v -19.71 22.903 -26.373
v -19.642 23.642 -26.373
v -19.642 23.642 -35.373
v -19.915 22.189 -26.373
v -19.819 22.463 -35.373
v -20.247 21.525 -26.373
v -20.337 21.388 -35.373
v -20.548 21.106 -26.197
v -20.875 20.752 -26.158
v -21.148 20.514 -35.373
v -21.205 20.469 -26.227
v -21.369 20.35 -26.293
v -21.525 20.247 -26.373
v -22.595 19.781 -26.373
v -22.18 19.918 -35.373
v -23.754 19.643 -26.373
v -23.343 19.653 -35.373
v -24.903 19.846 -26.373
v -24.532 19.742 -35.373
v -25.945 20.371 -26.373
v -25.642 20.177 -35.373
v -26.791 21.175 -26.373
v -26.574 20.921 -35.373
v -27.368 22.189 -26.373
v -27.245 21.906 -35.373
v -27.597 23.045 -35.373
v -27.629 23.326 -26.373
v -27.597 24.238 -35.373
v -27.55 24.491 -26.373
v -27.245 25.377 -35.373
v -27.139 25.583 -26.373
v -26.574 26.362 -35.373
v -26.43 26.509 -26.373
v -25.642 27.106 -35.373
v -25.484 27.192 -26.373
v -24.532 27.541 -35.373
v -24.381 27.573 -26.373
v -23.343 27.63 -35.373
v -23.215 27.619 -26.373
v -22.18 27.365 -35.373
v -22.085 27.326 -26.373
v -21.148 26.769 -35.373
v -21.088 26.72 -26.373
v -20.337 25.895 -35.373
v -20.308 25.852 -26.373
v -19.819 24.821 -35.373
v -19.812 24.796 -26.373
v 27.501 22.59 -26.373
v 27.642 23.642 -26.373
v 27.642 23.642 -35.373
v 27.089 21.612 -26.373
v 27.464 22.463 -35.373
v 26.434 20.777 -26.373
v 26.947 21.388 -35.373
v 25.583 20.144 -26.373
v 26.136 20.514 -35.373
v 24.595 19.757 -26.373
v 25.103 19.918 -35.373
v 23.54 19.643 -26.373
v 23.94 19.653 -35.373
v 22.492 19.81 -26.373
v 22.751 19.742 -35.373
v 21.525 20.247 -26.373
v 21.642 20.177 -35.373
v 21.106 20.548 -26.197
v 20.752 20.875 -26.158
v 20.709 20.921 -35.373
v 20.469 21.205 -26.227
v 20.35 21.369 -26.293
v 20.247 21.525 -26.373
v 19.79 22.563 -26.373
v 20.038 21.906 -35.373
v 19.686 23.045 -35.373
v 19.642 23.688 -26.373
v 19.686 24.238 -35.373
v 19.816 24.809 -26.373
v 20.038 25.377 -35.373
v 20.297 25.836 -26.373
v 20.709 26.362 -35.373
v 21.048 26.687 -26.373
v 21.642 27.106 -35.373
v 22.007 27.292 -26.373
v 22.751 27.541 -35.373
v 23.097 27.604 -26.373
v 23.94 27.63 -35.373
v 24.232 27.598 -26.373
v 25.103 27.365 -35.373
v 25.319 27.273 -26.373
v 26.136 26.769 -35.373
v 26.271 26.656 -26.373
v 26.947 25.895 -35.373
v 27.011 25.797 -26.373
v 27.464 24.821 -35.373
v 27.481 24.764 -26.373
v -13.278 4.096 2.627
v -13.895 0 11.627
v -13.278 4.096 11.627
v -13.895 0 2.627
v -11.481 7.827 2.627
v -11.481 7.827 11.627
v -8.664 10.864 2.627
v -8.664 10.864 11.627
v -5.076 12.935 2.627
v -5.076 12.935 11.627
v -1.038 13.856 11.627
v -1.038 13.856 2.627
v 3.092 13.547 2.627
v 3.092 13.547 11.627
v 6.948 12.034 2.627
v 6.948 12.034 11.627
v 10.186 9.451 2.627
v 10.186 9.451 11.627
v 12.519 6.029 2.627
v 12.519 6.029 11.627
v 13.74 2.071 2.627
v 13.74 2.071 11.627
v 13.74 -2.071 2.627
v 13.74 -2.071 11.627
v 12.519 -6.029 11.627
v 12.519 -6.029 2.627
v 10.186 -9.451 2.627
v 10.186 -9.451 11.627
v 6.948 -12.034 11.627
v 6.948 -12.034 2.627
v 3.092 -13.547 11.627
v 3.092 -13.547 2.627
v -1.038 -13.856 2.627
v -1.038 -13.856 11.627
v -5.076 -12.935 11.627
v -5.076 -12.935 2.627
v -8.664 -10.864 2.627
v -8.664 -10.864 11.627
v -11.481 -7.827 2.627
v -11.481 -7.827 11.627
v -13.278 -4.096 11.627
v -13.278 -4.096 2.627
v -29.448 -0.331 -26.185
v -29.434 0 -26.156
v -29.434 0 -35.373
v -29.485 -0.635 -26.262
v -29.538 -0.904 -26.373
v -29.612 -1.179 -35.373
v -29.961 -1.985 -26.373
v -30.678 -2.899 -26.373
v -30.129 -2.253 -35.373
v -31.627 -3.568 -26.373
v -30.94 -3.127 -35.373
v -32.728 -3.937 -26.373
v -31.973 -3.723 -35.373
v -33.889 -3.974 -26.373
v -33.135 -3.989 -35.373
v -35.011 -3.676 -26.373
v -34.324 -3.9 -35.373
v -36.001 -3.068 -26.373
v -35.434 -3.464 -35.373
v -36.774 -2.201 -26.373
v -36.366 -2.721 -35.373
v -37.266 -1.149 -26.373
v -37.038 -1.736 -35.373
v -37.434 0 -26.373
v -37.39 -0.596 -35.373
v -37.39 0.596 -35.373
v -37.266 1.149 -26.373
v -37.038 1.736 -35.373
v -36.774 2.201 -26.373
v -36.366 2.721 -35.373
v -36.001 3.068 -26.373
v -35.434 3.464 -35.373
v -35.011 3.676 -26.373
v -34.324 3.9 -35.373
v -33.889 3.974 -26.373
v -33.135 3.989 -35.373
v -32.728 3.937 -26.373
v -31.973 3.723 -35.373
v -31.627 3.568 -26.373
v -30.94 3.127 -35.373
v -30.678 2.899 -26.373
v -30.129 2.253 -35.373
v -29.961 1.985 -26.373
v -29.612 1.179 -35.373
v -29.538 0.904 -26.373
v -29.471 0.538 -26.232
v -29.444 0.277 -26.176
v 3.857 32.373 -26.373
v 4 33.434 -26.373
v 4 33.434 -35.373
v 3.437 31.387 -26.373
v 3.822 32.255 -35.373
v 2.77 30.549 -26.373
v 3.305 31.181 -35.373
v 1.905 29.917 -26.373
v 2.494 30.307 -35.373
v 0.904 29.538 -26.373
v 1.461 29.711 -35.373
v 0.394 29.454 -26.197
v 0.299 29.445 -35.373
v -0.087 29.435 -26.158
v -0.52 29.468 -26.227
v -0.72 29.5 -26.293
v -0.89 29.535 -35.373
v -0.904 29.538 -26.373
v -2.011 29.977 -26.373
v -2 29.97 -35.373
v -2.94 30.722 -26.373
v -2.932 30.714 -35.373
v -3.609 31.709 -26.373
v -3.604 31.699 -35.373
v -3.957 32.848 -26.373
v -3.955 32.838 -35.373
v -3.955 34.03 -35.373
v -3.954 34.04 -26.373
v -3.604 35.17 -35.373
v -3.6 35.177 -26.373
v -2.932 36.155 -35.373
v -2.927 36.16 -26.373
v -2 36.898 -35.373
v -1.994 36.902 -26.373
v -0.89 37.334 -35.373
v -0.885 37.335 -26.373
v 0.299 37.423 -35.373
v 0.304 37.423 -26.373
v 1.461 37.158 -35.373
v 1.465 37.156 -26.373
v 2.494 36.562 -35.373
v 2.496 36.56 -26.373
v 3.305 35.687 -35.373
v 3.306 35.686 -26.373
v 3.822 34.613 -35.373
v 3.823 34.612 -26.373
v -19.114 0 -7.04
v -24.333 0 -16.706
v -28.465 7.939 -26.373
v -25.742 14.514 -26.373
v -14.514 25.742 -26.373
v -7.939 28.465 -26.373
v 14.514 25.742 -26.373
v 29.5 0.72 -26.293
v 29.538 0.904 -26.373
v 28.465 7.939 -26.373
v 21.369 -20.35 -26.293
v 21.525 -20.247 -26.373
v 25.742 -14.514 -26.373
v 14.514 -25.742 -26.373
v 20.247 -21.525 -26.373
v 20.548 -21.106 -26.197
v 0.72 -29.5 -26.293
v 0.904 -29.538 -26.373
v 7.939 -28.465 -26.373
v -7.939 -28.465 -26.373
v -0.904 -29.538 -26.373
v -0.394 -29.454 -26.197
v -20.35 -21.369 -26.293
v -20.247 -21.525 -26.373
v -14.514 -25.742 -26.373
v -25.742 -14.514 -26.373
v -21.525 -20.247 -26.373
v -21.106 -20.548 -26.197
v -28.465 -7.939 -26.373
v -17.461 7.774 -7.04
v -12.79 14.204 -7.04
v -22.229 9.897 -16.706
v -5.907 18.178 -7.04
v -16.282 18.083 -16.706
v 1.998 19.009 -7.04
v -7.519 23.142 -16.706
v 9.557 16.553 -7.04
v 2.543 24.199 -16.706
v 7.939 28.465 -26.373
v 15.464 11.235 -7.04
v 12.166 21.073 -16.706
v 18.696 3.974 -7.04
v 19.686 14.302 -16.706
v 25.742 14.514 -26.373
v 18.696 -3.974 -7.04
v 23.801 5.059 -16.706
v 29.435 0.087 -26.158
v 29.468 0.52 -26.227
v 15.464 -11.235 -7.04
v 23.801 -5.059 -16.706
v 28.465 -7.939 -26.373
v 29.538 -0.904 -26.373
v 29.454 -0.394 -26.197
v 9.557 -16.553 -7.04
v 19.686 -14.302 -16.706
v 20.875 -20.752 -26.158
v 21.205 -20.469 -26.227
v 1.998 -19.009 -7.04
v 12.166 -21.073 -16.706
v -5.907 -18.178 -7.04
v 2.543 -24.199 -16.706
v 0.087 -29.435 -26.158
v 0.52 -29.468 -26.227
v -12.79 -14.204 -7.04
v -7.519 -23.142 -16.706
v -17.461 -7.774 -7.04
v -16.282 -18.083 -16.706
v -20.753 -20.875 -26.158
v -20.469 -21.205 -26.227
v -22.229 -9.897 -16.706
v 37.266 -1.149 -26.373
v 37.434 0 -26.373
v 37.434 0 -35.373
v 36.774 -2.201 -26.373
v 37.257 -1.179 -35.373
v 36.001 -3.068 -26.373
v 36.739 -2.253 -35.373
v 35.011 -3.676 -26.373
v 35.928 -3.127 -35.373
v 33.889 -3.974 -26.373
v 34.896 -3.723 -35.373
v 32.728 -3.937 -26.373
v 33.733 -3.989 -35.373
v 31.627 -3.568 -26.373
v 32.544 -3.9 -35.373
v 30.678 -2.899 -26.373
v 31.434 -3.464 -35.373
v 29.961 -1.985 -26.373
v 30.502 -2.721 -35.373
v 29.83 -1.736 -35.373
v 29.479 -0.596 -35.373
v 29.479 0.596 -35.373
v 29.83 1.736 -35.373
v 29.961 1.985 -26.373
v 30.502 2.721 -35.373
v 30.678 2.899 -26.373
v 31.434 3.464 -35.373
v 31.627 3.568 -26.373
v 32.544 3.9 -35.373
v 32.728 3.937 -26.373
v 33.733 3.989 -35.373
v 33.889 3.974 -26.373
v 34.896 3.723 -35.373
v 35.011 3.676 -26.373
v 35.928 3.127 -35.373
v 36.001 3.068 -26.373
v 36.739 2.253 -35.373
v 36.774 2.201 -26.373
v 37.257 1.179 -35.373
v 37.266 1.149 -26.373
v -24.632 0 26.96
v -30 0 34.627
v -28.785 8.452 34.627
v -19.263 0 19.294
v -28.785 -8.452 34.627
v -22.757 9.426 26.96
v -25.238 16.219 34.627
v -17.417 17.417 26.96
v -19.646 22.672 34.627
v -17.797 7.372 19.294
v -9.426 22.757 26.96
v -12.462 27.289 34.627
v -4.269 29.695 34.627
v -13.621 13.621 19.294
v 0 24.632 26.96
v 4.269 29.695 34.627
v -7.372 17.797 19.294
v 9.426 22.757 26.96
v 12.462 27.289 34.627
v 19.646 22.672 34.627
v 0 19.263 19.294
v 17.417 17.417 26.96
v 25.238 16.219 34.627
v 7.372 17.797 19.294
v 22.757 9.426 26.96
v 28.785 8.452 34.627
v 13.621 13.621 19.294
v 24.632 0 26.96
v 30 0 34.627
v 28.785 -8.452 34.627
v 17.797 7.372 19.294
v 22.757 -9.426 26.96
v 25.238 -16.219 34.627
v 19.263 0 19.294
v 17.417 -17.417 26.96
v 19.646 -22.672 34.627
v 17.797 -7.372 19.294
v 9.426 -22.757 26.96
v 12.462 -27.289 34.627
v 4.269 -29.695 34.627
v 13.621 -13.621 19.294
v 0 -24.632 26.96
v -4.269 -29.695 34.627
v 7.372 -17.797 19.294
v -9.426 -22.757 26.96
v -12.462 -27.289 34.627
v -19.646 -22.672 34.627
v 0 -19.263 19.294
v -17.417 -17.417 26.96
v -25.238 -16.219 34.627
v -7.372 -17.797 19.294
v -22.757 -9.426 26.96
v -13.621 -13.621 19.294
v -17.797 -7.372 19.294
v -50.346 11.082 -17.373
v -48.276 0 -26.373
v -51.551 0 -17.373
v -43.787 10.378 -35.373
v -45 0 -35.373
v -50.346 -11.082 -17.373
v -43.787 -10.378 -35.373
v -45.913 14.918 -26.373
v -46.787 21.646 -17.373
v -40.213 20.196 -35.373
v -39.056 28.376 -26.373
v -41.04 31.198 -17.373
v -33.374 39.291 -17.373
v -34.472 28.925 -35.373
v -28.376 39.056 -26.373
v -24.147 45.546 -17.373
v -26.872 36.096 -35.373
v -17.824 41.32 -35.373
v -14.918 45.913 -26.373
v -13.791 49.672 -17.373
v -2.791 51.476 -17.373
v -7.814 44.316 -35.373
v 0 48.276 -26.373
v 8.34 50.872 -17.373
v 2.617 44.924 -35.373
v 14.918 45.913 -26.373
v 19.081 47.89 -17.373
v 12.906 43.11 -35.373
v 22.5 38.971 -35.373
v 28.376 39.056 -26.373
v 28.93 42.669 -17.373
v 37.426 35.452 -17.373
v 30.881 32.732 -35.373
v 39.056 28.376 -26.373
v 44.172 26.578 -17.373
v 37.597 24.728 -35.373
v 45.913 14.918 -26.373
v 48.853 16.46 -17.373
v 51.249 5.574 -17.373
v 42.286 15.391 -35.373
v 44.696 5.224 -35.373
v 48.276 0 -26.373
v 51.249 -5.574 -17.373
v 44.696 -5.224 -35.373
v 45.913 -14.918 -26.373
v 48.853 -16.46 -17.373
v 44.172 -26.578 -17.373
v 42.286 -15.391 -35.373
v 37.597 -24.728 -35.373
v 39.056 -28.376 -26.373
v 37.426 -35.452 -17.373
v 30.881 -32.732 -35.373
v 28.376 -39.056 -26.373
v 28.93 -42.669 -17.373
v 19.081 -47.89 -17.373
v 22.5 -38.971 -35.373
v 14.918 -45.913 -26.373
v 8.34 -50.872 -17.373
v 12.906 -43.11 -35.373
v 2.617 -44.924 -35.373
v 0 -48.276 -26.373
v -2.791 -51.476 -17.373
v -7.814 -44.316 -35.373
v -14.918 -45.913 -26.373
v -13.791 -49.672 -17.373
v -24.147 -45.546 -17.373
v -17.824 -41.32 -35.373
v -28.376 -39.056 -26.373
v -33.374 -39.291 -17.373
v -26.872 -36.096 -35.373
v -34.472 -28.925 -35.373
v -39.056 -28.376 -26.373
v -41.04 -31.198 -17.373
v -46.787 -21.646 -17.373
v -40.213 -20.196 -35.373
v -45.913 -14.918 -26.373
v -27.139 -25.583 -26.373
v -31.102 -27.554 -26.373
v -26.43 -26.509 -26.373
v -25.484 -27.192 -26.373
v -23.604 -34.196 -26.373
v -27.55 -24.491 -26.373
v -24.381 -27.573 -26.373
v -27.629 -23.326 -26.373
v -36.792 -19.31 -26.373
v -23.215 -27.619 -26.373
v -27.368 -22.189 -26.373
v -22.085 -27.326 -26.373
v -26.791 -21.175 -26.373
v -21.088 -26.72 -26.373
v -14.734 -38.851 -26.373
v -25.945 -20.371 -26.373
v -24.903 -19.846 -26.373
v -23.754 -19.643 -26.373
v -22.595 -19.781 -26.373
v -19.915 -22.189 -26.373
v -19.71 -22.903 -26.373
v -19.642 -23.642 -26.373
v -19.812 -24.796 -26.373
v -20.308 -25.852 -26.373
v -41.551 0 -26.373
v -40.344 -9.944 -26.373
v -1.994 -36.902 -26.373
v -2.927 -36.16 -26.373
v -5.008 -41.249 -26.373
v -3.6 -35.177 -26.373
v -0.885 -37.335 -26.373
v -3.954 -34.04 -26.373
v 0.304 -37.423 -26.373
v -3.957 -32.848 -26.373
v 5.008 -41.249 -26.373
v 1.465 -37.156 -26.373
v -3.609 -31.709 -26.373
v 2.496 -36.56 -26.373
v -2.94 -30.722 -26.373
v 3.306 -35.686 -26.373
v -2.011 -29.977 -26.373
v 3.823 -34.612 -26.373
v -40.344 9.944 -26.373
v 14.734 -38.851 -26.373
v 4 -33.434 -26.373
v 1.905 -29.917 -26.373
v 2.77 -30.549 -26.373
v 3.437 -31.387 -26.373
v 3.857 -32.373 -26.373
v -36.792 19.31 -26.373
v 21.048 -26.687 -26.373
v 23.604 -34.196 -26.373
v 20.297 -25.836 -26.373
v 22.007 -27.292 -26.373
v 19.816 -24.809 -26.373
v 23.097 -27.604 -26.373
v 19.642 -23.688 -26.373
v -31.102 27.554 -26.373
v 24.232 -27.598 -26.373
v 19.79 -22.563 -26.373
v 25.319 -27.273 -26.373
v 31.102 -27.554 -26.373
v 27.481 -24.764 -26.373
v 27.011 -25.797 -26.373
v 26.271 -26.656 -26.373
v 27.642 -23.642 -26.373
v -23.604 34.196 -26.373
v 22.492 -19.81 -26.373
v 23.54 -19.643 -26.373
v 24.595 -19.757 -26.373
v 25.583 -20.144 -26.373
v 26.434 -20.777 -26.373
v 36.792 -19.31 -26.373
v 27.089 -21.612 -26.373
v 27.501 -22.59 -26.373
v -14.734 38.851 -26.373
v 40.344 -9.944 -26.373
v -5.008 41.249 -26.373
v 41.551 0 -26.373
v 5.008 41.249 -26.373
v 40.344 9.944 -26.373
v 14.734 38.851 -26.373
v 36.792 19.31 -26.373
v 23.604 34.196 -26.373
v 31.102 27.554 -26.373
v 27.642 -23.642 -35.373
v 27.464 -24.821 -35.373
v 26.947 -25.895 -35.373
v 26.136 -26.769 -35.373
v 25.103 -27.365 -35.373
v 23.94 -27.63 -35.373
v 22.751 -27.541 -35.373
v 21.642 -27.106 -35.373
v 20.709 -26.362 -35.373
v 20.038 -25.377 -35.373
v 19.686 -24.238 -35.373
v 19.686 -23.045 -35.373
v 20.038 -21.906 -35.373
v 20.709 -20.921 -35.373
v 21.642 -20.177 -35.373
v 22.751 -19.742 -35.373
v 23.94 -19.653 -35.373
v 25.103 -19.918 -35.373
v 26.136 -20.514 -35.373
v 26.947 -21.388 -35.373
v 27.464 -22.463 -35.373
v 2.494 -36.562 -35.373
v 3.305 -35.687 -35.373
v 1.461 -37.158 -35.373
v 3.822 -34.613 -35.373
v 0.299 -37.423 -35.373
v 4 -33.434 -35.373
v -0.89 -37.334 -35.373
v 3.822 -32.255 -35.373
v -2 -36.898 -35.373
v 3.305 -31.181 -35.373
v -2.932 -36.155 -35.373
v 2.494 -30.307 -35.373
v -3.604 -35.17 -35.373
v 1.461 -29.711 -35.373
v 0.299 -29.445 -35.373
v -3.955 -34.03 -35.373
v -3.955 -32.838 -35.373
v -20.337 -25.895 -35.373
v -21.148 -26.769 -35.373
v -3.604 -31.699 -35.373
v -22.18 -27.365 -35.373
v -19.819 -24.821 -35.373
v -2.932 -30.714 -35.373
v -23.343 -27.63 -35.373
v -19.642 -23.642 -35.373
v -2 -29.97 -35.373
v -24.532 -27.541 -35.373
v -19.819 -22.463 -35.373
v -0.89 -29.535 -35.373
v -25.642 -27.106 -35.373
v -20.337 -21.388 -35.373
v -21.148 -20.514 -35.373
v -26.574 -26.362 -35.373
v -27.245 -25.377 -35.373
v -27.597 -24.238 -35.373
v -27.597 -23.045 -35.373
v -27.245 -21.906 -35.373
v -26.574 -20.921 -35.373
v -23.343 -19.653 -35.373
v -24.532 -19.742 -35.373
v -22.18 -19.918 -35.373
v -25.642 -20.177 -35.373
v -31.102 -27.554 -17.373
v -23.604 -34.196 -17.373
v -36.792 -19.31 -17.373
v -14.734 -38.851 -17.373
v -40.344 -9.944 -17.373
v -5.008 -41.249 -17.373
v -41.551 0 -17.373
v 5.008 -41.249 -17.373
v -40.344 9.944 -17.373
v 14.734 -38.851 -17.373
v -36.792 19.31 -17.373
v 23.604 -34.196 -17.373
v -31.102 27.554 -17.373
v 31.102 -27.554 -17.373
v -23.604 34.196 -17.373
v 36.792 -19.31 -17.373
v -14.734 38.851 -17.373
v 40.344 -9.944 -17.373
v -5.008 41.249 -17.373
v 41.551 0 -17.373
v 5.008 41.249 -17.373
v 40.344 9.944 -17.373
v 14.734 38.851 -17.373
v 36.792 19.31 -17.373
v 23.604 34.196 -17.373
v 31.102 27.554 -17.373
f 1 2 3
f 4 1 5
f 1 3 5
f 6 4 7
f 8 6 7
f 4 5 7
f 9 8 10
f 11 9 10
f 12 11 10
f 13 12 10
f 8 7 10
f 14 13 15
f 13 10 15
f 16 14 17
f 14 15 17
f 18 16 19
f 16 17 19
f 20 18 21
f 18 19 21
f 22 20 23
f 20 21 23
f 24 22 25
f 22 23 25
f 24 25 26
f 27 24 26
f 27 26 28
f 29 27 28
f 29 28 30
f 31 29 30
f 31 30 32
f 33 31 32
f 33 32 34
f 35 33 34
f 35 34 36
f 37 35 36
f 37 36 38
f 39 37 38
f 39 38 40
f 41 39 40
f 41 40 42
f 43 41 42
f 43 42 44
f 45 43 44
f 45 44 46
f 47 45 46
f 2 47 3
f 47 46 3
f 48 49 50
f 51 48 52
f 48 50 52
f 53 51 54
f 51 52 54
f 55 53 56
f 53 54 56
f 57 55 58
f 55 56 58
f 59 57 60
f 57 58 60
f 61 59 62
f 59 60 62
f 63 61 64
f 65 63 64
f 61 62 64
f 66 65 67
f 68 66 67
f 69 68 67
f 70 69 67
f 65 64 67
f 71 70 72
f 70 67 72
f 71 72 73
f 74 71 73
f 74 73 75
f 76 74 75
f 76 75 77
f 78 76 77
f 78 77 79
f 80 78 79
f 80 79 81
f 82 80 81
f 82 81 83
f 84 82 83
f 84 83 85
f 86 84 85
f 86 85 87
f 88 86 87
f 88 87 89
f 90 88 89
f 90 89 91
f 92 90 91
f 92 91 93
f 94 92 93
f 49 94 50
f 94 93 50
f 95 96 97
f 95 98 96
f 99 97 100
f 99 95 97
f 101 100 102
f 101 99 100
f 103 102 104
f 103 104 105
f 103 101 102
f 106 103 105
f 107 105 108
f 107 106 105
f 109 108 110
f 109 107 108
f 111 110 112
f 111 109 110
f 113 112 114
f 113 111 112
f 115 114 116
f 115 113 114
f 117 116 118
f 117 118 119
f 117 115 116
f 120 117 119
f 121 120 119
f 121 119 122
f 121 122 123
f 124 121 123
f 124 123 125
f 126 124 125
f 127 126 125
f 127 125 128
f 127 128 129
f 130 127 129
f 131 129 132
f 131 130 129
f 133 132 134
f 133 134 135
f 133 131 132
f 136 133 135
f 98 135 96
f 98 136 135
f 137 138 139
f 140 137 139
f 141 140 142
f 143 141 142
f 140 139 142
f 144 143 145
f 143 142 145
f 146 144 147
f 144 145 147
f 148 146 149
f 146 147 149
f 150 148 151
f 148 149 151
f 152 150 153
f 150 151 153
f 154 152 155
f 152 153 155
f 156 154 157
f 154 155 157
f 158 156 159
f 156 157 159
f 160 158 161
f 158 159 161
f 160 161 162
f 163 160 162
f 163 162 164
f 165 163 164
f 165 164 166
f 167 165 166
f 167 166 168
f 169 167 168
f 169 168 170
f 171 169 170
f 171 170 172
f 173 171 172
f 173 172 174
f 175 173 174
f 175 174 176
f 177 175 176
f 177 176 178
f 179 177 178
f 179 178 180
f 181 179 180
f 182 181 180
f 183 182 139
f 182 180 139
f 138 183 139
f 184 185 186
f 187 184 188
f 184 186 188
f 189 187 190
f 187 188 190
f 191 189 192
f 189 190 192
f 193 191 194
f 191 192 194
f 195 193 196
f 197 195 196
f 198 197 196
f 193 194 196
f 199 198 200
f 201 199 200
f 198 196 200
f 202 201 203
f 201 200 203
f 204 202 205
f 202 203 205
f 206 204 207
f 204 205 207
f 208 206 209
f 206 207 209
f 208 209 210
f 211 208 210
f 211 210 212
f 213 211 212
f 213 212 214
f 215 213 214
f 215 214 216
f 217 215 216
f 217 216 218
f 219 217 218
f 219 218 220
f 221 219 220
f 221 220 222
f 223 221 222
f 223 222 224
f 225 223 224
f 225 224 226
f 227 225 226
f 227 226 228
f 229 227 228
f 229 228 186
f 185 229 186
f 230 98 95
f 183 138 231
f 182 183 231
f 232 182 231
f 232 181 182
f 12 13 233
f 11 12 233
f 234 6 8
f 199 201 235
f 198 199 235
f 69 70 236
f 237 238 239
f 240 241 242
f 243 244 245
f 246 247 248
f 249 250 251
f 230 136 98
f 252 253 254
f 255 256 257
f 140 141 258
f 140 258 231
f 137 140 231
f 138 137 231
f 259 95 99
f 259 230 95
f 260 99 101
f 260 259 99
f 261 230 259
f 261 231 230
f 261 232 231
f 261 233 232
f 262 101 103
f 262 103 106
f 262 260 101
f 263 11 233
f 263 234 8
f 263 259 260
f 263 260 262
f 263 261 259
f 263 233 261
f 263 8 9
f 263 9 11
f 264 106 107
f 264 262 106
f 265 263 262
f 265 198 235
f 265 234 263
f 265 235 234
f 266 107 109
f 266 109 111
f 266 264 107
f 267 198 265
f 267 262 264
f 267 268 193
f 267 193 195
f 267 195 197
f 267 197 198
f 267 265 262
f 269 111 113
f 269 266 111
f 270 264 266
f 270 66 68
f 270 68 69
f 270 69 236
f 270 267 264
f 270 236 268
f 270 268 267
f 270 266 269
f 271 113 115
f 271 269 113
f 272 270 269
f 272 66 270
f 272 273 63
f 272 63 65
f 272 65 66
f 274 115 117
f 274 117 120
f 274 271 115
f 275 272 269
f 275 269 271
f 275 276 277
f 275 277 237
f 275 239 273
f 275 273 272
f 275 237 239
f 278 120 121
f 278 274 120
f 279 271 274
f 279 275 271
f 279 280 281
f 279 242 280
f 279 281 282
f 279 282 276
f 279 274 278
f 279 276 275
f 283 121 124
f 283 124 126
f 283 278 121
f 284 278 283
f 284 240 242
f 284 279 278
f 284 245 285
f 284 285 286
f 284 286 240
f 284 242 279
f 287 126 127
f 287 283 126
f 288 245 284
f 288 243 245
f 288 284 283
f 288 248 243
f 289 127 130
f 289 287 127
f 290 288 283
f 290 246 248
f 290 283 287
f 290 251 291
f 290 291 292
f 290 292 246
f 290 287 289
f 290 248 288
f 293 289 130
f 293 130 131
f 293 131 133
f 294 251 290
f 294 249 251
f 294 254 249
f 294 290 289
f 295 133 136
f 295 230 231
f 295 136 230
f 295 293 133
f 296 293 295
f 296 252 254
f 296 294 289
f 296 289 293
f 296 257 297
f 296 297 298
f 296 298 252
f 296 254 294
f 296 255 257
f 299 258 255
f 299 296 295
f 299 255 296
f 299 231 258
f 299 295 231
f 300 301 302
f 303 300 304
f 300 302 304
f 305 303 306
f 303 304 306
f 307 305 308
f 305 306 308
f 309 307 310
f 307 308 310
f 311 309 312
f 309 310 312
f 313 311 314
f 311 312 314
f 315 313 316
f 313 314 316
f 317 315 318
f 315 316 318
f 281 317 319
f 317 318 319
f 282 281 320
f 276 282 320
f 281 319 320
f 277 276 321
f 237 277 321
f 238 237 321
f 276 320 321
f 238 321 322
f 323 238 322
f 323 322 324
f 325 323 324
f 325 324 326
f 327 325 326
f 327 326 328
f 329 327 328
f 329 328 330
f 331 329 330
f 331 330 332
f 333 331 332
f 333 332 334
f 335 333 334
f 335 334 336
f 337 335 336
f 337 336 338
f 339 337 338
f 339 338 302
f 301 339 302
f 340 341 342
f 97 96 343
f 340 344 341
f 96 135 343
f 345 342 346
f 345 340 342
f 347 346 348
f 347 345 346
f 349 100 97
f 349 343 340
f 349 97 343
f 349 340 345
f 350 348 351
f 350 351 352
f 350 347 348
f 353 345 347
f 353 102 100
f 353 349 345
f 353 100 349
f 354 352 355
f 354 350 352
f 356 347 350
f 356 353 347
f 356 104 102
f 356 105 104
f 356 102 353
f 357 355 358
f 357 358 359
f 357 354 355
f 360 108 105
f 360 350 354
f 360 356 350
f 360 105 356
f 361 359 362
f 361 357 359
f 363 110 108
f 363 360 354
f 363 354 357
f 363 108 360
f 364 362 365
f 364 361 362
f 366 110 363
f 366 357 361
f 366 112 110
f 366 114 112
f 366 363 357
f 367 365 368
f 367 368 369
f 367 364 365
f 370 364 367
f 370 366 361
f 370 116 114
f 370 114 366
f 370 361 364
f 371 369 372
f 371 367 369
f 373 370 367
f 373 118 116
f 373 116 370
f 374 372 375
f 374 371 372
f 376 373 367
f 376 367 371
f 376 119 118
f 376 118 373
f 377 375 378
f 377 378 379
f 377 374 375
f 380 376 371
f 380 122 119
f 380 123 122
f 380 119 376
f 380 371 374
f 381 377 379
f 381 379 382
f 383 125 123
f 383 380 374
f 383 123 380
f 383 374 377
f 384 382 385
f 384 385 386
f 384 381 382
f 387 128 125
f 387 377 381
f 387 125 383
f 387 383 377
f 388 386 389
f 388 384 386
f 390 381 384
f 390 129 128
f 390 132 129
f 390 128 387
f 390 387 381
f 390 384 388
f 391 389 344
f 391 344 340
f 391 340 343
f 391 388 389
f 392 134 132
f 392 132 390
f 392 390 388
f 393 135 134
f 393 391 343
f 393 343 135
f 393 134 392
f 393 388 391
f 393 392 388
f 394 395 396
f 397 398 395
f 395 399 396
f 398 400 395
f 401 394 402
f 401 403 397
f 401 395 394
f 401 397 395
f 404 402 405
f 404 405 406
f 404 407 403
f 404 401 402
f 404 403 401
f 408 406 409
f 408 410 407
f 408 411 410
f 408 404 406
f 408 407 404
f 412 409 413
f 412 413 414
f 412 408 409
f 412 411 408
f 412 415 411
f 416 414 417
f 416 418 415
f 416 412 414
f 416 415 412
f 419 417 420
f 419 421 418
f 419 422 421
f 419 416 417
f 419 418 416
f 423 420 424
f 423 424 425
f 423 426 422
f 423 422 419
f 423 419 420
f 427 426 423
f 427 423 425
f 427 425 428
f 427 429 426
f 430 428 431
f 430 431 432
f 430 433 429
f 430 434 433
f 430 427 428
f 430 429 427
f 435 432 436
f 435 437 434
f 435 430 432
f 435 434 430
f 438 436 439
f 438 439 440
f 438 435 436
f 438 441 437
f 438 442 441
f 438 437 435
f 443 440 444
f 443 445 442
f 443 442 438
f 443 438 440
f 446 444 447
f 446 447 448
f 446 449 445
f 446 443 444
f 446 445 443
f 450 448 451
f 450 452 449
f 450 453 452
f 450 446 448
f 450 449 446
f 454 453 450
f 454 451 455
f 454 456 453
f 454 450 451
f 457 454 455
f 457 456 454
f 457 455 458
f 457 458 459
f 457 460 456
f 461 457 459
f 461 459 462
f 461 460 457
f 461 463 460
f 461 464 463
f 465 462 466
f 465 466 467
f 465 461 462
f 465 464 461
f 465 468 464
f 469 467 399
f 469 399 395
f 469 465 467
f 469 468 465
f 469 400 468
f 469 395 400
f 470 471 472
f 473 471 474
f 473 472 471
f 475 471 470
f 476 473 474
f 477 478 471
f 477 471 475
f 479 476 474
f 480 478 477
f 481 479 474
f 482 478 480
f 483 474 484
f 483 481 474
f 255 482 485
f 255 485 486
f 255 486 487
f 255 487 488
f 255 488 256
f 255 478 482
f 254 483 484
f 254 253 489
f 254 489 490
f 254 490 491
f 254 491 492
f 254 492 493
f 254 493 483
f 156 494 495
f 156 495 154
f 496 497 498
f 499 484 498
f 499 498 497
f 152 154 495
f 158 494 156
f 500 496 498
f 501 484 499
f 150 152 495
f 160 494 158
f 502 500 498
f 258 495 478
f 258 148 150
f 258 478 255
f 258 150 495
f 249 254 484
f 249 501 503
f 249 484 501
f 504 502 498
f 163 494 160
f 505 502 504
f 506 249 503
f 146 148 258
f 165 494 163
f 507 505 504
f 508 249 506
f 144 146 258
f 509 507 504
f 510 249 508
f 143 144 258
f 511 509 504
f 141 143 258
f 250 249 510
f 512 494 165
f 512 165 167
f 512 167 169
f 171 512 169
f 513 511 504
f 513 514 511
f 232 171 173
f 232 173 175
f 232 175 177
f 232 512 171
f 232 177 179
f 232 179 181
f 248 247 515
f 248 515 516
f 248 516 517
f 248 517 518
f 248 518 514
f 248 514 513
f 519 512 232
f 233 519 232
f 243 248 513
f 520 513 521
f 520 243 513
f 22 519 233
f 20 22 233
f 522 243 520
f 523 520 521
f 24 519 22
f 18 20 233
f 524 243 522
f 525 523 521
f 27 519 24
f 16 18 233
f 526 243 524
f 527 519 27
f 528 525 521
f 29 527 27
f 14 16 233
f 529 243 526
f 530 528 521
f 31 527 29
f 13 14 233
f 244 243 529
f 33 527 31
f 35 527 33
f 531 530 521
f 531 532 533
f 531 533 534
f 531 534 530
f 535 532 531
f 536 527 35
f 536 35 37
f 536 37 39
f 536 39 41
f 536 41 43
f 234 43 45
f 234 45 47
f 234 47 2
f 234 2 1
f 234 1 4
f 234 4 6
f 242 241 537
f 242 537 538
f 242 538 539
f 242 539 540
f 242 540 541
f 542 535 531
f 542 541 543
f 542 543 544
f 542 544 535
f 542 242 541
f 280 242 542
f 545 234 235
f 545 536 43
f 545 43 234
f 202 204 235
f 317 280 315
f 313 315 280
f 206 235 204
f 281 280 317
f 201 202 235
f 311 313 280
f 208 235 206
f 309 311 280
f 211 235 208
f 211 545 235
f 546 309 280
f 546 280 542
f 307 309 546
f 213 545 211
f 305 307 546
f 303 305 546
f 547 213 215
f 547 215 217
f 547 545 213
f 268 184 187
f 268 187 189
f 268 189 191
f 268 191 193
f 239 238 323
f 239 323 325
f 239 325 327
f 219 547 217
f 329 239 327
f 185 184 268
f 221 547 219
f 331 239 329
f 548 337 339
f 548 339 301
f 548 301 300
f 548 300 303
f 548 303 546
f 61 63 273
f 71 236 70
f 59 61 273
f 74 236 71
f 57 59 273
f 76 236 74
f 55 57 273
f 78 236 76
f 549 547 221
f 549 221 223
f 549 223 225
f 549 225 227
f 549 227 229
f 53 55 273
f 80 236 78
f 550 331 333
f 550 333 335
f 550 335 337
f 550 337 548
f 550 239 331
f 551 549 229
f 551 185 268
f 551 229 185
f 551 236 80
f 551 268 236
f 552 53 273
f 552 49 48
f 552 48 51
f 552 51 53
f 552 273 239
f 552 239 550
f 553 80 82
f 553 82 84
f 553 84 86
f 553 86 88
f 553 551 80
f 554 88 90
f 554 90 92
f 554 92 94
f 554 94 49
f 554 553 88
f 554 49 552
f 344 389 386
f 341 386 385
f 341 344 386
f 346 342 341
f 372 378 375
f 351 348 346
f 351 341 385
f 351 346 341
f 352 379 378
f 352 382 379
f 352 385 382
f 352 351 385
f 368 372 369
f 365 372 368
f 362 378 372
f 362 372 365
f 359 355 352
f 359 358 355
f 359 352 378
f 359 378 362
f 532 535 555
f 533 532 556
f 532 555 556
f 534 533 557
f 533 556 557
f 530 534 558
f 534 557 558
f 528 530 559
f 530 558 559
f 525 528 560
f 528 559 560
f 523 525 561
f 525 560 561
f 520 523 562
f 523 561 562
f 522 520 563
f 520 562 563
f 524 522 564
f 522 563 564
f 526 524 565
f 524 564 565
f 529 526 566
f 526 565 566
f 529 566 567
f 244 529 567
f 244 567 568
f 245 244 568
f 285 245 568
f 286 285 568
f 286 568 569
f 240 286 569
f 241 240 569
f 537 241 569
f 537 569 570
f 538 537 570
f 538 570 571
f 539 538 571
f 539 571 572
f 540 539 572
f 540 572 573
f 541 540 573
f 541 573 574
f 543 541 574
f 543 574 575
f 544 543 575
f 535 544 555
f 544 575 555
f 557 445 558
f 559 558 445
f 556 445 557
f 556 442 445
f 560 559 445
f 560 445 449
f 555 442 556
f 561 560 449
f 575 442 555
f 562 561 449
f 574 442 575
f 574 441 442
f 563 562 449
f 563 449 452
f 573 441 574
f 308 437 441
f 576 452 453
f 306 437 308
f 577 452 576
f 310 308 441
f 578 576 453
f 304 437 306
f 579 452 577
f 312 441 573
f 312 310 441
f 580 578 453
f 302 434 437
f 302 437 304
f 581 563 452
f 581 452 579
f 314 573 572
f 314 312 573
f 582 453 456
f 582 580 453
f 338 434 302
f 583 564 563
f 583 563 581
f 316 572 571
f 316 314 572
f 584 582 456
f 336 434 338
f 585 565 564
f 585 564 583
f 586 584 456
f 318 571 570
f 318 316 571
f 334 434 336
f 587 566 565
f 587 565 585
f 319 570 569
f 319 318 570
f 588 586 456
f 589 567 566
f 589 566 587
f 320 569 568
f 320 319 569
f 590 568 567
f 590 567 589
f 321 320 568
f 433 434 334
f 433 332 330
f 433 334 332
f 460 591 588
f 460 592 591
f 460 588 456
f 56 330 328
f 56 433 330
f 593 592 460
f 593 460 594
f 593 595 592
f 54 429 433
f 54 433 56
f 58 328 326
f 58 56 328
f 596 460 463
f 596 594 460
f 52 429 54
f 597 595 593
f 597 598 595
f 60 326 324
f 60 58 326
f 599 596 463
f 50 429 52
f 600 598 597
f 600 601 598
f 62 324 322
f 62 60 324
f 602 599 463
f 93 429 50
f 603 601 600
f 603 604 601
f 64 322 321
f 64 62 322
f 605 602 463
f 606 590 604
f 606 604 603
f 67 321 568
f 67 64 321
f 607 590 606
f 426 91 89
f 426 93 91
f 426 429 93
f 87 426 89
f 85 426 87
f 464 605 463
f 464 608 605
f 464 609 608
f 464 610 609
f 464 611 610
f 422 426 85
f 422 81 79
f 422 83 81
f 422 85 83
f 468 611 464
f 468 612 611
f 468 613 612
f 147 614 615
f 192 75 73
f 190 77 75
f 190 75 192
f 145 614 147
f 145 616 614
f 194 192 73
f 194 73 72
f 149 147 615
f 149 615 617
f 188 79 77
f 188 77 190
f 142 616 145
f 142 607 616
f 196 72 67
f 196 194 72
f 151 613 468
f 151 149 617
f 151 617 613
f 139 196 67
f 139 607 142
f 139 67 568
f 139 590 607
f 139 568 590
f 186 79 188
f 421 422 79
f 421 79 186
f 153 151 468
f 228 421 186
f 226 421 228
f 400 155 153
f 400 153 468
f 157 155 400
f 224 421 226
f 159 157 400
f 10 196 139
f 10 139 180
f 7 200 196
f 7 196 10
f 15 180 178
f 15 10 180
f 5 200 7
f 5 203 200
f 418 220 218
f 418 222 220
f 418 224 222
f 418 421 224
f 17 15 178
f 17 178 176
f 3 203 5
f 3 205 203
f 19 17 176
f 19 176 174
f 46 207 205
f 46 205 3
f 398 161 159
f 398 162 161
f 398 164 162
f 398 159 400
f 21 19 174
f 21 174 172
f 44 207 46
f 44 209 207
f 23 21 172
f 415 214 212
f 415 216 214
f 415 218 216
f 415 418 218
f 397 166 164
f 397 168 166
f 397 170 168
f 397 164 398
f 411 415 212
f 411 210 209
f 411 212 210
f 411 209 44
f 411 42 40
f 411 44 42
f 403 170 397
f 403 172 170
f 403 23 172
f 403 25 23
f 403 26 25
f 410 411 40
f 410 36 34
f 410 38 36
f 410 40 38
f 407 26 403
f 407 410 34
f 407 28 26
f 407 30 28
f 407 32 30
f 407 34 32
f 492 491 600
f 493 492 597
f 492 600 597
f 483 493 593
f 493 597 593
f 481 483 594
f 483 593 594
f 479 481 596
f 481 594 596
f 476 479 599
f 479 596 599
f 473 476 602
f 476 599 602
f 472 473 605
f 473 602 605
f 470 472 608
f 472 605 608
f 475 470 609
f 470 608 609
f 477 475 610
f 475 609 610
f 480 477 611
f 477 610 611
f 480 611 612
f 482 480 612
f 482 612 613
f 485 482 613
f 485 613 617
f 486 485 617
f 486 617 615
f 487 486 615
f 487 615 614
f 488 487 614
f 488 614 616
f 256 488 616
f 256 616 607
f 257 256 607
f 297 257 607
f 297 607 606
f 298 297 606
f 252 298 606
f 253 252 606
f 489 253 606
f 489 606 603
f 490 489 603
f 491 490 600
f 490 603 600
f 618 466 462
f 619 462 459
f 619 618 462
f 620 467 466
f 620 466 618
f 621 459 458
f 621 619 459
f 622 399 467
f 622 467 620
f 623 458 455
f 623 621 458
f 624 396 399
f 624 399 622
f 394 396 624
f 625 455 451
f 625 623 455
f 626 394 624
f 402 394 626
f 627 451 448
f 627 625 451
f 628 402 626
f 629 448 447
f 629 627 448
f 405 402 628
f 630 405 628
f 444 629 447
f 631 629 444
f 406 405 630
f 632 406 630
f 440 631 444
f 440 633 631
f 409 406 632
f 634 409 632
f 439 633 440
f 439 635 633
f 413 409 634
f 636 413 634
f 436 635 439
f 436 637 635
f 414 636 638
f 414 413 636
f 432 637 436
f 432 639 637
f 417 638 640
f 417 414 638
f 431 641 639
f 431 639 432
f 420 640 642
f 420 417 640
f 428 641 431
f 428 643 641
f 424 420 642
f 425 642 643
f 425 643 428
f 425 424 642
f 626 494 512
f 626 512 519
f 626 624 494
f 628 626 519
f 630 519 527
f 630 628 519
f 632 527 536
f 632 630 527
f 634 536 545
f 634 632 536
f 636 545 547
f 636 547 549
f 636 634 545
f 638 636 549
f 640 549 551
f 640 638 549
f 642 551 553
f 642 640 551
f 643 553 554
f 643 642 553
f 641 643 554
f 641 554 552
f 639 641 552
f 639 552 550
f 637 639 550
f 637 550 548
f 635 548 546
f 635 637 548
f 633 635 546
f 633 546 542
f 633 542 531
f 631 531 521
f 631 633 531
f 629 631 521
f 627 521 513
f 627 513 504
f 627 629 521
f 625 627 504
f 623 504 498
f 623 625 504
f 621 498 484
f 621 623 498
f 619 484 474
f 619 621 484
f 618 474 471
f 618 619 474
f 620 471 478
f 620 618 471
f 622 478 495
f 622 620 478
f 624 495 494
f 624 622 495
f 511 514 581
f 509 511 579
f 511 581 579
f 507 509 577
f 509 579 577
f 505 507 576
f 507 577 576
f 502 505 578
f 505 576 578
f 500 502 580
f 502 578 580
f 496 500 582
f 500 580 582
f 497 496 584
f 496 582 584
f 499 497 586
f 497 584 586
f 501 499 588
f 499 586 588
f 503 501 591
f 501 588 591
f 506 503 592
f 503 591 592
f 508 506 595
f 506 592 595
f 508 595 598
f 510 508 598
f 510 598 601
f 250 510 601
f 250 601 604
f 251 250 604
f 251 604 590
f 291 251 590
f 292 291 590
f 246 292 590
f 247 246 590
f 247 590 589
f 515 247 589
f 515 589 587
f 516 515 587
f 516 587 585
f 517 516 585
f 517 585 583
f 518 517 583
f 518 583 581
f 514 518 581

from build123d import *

# Parameters (mm, degrees)
F2_R     = 4
F3_DEPTH = 9.2181856301


with BuildPart() as f1:
    # F0 (on Front) → F1 (revolve)
    with BuildSketch(Plane.XZ):
        Polygon((0, -35.3728421032), (0, 34.6271578968), (-30, 34.6271578968), (-13.8952266212, 11.6271578968), (-13.8952266212, 2.6271578968), (-29.5514642168, -26.3728421032), (-41.5514642168, -26.3728421032), (-41.5514642168, -17.3728421032), (-51.5514642168, -17.3728421032), (-45, -35.3728421032), align=None)
    revolve(axis=Axis((0, 0, -0.3728421032), (0, 0, -1)))

    # F2 (on face) → F3 (cut, through all)
    with BuildSketch(Plane(origin=(0, 0, -35.3728421032), x_dir=(1, 0, 0), z_dir=(0, 0, -1))):
        with Locations((-33.4342122078, 0)):
            Circle(F2_R)
        with Locations((-23.6415581758, -23.6415581758)):
            Circle(F2_R)
        with Locations((0, -33.4342122078)):
            Circle(F2_R)
        with Locations((23.6415581758, -23.6415581758)):
            Circle(F2_R)
        with Locations((33.4342122078, 0)):
            Circle(F2_R)
        with Locations((23.6415581758, 23.6415581758)):
            Circle(F2_R)
        with Locations((0, 33.4342122078)):
            Circle(F2_R)
        with Locations((-23.6415581758, 23.6415581758)):
            Circle(F2_R)
    extrude(amount=-F3_DEPTH, mode=Mode.SUBTRACT)


solid = f1.part
